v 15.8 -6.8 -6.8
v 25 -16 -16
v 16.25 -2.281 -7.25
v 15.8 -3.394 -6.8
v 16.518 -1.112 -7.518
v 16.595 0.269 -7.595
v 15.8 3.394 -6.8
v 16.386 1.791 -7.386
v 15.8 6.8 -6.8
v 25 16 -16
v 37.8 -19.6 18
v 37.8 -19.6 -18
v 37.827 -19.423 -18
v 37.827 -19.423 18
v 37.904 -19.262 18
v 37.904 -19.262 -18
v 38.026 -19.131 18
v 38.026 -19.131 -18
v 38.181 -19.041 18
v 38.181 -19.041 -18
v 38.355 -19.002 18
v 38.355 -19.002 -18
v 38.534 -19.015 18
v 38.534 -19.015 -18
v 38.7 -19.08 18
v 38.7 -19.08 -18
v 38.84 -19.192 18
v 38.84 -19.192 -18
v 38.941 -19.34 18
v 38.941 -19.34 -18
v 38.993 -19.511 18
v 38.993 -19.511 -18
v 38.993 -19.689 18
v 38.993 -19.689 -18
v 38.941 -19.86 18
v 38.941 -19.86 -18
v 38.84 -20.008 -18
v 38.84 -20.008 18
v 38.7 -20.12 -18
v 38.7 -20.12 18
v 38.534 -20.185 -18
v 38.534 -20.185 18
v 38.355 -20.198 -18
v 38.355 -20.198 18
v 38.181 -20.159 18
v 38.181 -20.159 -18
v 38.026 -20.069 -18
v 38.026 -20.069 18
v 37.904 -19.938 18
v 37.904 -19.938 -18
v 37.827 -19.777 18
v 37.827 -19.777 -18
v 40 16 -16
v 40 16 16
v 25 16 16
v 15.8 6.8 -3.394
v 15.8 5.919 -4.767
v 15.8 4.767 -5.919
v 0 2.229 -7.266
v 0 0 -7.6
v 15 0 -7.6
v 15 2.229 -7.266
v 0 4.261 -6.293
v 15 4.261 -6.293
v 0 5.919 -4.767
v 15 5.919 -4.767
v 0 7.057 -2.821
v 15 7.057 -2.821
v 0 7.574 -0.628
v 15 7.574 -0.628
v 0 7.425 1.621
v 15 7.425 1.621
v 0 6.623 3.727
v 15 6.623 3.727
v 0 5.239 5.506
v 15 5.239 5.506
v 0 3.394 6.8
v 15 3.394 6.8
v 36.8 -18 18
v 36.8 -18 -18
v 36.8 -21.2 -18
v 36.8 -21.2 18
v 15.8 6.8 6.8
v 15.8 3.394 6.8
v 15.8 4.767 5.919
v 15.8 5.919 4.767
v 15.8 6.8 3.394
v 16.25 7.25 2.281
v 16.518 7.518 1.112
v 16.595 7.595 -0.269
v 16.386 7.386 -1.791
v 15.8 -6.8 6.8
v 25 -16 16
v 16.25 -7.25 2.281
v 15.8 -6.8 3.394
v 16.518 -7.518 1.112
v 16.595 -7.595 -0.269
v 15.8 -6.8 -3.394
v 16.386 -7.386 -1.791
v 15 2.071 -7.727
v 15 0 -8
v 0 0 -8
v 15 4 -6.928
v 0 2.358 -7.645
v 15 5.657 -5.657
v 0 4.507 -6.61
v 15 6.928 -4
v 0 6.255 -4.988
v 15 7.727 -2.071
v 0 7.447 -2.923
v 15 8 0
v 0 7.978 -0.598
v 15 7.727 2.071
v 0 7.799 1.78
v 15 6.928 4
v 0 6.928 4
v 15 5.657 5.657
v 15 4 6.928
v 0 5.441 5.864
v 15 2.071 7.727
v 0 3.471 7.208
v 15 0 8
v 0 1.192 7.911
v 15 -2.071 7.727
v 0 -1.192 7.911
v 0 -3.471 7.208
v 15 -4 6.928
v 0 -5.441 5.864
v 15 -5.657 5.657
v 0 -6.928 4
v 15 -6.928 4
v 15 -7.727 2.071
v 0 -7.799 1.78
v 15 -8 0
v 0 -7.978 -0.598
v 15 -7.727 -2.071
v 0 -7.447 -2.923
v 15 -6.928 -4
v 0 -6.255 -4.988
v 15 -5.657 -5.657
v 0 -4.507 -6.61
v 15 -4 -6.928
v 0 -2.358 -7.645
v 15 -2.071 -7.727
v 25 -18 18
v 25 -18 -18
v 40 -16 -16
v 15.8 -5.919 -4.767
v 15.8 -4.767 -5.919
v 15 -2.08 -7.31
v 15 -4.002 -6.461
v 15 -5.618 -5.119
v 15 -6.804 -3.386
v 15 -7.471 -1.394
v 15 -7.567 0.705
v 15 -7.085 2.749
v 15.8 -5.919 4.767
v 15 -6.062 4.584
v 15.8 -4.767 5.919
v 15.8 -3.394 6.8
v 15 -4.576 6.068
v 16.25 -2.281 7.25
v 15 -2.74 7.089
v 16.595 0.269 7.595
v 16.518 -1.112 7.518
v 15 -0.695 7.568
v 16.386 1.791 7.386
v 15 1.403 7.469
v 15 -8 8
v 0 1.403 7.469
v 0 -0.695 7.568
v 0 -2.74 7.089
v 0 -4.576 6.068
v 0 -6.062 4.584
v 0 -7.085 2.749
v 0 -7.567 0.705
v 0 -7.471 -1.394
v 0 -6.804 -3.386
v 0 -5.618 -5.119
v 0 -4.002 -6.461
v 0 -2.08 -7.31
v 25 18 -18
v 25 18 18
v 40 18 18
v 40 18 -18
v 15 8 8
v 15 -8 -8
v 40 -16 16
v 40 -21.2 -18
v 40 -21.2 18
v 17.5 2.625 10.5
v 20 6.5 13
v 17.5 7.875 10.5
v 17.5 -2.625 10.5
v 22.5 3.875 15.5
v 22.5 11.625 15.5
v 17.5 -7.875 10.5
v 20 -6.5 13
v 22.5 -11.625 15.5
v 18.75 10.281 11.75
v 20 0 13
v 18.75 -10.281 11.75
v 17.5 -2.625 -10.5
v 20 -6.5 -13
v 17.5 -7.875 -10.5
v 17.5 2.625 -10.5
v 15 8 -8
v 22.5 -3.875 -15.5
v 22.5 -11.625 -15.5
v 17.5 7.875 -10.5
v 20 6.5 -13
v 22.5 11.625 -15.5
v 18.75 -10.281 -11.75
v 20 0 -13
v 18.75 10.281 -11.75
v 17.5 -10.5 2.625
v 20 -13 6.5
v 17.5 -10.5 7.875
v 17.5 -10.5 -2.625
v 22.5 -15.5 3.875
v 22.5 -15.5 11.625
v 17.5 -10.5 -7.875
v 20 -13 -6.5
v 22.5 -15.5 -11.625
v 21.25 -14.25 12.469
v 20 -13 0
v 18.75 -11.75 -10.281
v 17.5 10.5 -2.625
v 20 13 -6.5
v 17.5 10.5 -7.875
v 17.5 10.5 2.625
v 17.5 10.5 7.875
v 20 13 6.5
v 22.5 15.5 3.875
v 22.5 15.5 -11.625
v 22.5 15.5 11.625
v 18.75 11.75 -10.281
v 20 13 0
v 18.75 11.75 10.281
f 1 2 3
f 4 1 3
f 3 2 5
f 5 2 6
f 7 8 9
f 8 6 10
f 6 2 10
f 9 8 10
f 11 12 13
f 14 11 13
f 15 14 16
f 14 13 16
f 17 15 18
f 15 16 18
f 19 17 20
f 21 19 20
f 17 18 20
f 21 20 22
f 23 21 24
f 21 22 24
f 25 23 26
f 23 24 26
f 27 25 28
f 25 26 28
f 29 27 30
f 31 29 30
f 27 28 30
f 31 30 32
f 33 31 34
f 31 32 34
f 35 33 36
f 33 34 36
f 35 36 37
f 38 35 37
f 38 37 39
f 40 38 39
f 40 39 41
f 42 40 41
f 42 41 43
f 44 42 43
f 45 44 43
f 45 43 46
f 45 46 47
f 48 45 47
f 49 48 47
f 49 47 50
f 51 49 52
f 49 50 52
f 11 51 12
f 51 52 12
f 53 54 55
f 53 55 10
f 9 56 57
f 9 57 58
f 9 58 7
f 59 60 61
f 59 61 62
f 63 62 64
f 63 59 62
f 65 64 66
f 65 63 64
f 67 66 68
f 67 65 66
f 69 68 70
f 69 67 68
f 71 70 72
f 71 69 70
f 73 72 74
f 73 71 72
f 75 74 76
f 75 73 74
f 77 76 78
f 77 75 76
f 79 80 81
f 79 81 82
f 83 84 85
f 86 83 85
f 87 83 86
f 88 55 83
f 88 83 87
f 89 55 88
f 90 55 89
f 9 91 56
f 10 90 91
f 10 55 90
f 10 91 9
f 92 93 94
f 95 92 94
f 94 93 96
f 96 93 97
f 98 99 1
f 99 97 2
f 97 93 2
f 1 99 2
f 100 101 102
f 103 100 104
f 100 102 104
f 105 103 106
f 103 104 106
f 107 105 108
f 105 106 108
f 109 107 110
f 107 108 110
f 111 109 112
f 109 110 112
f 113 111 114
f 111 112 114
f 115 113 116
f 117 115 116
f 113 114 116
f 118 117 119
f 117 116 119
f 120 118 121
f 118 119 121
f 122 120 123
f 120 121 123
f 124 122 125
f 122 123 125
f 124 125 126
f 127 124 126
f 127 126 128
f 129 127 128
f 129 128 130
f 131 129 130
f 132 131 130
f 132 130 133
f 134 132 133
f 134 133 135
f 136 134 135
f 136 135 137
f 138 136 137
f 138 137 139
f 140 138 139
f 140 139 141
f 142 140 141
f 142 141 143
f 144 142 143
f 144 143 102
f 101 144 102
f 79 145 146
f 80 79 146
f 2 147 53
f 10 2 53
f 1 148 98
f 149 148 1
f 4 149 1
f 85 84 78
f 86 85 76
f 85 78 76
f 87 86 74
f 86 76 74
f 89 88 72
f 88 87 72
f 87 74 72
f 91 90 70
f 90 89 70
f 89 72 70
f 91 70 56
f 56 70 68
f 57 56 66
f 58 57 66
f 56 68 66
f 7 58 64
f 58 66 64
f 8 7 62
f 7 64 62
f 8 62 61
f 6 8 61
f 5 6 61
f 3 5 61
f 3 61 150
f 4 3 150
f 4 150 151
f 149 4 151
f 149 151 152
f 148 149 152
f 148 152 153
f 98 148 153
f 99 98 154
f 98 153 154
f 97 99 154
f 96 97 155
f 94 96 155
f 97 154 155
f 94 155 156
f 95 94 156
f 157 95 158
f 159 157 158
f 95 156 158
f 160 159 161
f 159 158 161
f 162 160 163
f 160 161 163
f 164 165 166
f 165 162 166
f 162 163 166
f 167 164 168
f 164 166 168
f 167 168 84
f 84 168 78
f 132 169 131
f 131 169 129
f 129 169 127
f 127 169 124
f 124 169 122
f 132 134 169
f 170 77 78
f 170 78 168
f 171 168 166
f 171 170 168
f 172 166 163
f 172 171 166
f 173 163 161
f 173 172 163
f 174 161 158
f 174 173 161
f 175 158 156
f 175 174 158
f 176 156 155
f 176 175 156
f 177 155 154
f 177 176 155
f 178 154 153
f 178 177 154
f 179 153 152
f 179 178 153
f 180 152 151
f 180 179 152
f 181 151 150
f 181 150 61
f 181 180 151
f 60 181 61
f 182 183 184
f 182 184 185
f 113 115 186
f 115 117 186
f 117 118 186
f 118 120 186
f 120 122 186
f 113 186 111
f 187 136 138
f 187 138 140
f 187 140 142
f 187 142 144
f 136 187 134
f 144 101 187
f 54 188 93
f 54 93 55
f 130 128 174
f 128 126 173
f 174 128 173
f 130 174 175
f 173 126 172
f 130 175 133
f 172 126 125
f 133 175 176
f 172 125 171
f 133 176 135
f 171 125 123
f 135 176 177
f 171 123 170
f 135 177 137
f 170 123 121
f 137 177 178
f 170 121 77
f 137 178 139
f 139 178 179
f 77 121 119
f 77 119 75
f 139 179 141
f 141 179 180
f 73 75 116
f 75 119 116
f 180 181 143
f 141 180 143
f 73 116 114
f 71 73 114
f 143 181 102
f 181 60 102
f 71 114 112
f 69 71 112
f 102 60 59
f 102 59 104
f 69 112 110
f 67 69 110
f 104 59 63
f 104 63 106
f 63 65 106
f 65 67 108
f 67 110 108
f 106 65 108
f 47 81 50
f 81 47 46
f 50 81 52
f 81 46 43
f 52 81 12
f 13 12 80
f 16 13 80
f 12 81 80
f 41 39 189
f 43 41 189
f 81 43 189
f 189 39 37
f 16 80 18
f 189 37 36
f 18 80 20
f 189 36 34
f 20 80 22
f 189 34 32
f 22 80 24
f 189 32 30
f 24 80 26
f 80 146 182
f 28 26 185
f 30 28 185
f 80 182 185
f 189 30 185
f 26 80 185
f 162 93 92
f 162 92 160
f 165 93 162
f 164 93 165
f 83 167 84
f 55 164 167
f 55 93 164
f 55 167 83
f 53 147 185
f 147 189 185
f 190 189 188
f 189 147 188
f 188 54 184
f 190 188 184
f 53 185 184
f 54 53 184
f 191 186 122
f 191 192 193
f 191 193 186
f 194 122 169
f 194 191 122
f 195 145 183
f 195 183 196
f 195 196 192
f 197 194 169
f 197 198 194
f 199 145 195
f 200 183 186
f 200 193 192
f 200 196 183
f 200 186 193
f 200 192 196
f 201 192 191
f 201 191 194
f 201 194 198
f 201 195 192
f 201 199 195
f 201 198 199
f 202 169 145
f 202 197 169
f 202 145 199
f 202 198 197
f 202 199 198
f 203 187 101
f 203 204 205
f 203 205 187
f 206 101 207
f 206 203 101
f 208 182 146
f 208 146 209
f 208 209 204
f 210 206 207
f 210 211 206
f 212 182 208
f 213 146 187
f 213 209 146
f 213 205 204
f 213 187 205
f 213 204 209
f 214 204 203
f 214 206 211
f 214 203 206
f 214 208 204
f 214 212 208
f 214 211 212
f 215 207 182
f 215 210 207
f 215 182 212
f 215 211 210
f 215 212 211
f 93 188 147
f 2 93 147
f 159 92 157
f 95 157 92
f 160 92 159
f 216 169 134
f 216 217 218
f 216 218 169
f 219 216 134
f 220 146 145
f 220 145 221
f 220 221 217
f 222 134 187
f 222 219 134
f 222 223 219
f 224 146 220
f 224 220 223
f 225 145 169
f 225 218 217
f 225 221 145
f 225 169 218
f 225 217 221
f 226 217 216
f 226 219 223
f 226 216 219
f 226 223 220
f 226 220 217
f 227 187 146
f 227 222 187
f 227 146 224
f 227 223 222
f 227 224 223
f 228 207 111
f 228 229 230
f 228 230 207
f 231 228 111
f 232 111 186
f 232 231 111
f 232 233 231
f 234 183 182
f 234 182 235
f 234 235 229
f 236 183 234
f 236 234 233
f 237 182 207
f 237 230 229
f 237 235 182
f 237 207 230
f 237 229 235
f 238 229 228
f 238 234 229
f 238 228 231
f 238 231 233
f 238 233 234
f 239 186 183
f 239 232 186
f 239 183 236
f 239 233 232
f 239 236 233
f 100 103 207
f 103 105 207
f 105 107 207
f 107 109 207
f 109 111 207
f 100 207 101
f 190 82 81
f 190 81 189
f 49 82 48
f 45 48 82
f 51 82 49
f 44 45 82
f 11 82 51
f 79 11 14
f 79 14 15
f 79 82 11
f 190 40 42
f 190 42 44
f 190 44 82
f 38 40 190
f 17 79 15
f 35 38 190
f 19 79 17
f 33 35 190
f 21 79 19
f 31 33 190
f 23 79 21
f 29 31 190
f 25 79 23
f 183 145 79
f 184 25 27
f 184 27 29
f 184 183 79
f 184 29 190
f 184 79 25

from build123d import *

# Parameters (mm, degrees)
SKETCH_1_R          = 8
SKETCH_1_R_2        = 7.6
EXTRUDE_1_DEPTH     = 15
SKETCH_4_W          = 16
SKETCH_4_H          = 16
EXTRUDE_3_DEPTH     = 10
EXTRUDE_3_TAPER     = -45
SKETCH_6_W          = 36
SKETCH_6_H          = 36
EXTRUDE_5_DEPTH     = 15
SKETCH_7_W          = 32
SKETCH_7_H          = 32
CUT_EXTRUDE_3_DEPTH = 15
SKETCH_8_W          = 32
SKETCH_8_H          = 32
CUT_EXTRUDE_6_DEPTH = 9.2
CUT_EXTRUDE_6_DRAFT = -45
SKETCH_9_R          = 7.6
CUT_EXTRUDE_7_DEPTH = 40
SKETCH_10_W         = 3.2
SKETCH_10_H         = 36
EXTRUDE_7_DEPTH     = 3.2
SKETCH_11_R         = 0.6
CUT_EXTRUDE_8_DEPTH = 36


with BuildPart() as part:
    # Эскиз1 → Бобышка-Вытянуть1 (new body)
    with BuildSketch(Plane(origin=(0, 0, 0), x_dir=(0, 0, -1), z_dir=(1, 0, 0))):
        Circle(SKETCH_1_R)
        Circle(SKETCH_1_R_2, mode=Mode.SUBTRACT)
    extrude(amount=EXTRUDE_1_DEPTH)

    # Эскиз4 → Бобышка-Вытянуть3 (add)
    with BuildSketch(Plane(origin=(15, 0, 0), x_dir=(0, 0, -1), z_dir=(1, 0, 0))):
        Rectangle(SKETCH_4_W, SKETCH_4_H)
    extrude(amount=EXTRUDE_3_DEPTH, taper=EXTRUDE_3_TAPER)

    # Эскиз6 → Бобышка-Вытянуть5 (add)
    with BuildSketch(Plane(origin=(25, 0, 0), x_dir=(0, 0, -1), z_dir=(1, 0, 0))):
        Rectangle(SKETCH_6_W, SKETCH_6_H)
    extrude(amount=EXTRUDE_5_DEPTH)

    # Эскиз7 → Вырез-Вытянуть3 (cut)
    with BuildSketch(Plane(origin=(40, 0, 0), x_dir=(0, 0, -1), z_dir=(1, 0, 0))):
        Rectangle(SKETCH_7_W, SKETCH_7_H)
    extrude(amount=-CUT_EXTRUDE_3_DEPTH, mode=Mode.SUBTRACT)


with BuildPart() as cut_extrude_6_tool:
    # Эскиз8 → Вырез-Вытянуть6 (with draft: the straight prism first)
    with BuildSketch(Plane(origin=(25, 0, 0), x_dir=(0, 0, -1), z_dir=(1, 0, 0))):
        Rectangle(SKETCH_8_W, SKETCH_8_H)
    extrude(amount=-CUT_EXTRUDE_6_DEPTH)
    # Вырез-Вытянуть6: the draft: its side faces are tilted about the plane it starts from
    cut_extrude_6_sides = [cut_extrude_6_tool.faces().sort_by_distance(p)[0] for p in [
        (20.4, -16, 0),
        (20.4, 0, -16),
        (20.4, 16, 0),
        (20.4, 0, 16),
    ]]
    draft(cut_extrude_6_sides, Plane(origin=(25, 0, 0), x_dir=(0, 0, -1), z_dir=(1, 0, 0)), CUT_EXTRUDE_6_DRAFT)


with BuildPart() as part_1:
    add(part.part)

    # Вырез-Вытянуть6: cut by cut_extrude_6_tool
    add(cut_extrude_6_tool.part, mode=Mode.SUBTRACT)

    # Эскиз9 → Вырез-Вытянуть7 (cut)
    with BuildSketch(Plane.ZY):
        with Locations(Location((0, 0, 0), (0, 0, 26.525352017))):
            Circle(SKETCH_9_R)
    extrude(amount=-CUT_EXTRUDE_7_DEPTH, mode=Mode.SUBTRACT)

    # Эскиз10 → Бобышка-Вытянуть7 (add)
    with BuildSketch(Plane.XZ.offset(18)):
        with Locations((38.4, 0)):
            Rectangle(SKETCH_10_W, SKETCH_10_H)
    extrude(amount=EXTRUDE_7_DEPTH)

    # Эскиз11 → Вырез-Вытянуть8 (cut)
    with BuildSketch(Plane(origin=(0, 0, -18), x_dir=(-1, 0, 0), z_dir=(0, 0, -1))):
        with Locations((-38.4, -19.6)):
            Circle(SKETCH_11_R)
    extrude(amount=-CUT_EXTRUDE_8_DEPTH, mode=Mode.SUBTRACT)


solid = part_1.part
